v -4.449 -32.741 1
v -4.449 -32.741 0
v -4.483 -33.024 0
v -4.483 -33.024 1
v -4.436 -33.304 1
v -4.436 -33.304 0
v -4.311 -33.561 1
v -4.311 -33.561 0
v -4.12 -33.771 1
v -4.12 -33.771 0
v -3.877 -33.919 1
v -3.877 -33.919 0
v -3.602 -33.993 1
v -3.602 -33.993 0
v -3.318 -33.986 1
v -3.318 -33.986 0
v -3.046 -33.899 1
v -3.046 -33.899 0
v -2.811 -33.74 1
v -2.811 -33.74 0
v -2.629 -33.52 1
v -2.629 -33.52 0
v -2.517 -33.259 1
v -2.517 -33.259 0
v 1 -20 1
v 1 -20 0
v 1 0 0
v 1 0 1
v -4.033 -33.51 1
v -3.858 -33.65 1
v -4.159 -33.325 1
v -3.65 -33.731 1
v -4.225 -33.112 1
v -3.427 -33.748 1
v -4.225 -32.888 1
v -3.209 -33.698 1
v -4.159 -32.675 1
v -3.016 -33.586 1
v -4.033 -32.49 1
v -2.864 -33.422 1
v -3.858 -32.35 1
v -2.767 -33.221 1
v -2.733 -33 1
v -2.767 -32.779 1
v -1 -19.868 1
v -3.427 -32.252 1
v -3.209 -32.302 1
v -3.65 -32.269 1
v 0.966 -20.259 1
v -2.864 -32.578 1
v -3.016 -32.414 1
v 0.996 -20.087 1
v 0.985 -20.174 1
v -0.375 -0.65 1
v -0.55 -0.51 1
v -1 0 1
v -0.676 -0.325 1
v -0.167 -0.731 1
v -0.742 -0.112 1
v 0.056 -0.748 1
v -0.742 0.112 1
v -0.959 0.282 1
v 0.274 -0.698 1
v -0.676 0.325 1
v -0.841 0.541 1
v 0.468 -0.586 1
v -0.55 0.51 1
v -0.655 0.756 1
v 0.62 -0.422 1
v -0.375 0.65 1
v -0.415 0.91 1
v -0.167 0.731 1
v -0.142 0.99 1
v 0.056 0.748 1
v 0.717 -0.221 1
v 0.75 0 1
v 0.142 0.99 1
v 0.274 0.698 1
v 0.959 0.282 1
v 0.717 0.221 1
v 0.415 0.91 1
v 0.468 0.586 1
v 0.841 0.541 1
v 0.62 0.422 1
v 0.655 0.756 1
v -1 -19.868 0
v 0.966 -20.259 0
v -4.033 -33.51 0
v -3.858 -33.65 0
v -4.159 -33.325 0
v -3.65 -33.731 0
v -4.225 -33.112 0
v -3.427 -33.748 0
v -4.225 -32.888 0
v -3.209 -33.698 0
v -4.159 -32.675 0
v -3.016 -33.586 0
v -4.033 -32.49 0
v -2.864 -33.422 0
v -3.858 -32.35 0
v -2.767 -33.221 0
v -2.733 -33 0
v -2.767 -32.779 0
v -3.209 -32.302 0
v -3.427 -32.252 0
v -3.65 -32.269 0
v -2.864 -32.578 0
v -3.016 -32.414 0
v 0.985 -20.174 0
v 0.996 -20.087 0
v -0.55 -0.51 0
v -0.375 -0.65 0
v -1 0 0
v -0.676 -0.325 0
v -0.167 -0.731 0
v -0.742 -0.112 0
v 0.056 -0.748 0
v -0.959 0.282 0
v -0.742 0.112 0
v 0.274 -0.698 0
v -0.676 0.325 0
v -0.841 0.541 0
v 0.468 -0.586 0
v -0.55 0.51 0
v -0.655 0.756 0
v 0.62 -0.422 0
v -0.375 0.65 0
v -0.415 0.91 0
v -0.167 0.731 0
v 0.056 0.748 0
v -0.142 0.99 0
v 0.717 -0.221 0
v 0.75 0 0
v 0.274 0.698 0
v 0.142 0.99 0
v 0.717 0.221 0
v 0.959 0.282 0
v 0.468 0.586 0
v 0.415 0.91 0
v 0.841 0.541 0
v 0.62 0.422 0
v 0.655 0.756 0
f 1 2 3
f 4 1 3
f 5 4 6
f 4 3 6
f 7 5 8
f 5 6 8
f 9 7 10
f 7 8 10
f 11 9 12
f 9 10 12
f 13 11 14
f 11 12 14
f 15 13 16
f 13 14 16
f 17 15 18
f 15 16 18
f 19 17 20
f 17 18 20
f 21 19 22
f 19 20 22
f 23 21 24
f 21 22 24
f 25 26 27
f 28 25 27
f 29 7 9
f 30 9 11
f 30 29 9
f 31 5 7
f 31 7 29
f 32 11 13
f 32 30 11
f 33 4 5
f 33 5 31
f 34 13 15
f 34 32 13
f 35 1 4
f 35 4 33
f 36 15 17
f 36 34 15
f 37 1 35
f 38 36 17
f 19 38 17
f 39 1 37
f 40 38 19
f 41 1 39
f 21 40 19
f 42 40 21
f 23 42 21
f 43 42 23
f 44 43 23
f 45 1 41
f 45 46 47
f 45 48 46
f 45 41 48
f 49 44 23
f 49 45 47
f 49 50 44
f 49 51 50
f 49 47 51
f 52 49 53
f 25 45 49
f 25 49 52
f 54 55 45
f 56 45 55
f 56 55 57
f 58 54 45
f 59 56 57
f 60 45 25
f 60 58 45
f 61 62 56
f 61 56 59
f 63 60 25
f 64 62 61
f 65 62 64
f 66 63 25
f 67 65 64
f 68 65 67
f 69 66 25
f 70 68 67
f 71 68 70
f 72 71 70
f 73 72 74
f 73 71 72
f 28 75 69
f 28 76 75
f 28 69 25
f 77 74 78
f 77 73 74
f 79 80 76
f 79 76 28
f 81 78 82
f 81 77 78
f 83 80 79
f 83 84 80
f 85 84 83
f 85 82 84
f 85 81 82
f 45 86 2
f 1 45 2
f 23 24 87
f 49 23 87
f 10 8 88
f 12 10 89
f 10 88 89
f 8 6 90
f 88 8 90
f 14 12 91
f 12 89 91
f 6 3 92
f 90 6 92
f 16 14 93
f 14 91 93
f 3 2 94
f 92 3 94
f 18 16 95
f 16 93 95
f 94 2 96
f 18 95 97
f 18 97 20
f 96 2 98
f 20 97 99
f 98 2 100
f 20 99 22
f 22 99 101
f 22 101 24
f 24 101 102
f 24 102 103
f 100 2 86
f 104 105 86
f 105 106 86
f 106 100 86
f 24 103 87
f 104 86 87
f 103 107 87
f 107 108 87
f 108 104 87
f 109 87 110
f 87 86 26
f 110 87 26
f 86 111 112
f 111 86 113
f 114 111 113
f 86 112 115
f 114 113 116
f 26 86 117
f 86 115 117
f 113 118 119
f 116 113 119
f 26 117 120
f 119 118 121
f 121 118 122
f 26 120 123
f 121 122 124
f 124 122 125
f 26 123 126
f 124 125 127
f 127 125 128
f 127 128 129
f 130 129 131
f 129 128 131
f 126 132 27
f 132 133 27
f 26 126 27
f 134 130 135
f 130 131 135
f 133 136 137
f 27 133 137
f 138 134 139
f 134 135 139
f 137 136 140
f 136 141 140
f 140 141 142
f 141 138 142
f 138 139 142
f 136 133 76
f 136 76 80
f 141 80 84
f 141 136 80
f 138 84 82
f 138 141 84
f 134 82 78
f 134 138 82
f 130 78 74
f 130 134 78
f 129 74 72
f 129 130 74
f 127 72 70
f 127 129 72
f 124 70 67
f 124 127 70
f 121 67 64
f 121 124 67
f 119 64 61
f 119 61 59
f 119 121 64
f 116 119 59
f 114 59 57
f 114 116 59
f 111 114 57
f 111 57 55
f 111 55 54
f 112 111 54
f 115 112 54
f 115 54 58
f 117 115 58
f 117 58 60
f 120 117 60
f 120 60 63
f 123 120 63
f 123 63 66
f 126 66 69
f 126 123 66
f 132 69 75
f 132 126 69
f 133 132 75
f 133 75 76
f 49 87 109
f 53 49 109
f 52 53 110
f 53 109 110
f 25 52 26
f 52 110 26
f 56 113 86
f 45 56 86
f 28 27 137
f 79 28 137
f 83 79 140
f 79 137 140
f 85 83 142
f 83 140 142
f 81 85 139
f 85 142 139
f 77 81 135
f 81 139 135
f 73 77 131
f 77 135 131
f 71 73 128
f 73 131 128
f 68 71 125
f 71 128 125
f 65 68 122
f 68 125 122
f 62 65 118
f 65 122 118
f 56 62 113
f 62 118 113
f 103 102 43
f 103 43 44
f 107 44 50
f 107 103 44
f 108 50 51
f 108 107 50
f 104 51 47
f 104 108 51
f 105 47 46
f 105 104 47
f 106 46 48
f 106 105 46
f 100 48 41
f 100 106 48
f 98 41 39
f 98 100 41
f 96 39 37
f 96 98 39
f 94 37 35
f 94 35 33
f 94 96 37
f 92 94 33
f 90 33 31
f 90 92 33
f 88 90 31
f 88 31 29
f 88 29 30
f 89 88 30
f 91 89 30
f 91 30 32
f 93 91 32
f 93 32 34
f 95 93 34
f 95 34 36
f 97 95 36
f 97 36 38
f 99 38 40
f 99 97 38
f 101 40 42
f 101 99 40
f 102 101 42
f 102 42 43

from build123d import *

# Parameters (mm, degrees)
SKETCH1_R           = 0.75
BOSS_EXTRUDE1_DEPTH = 1


with BuildPart() as part:
    # Sketch1 → Boss-Extrude1 (new body)
    with BuildSketch(Plane.XY):
        with BuildLine():
            Line((-2.517413675, -33.258819045), (0.965925826, -20.258819045))
            ThreePointArc((0.965925826, -20.258819045), (-0.130526192, -20.991444861), (-1, -20))
            Line((-1, -20), (-1, -19.868347502))
            Line((-1, -19.868347502), (-4.449265328, -32.741180955))
            ThreePointArc((-4.449265328, -32.741180955), (-3.742158547, -33.965925826), (-2.517413675, -33.258819045))
        make_face()
        with Locations((-3.483339502, -33)):
            Circle(SKETCH1_R, mode=Mode.SUBTRACT)
        with BuildLine():
            ThreePointArc((0.965925826, -20.258819045), (0.991444861, -20.130526192), (1, -20))
            ThreePointArc((1, -20), (0.130526192, -19.008555139), (-0.965925826, -19.741180955))
            Line((-0.965925826, -19.741180955), (-1, -19.868347502))
            Line((-1, -19.868347502), (-1, -20))
            ThreePointArc((-1, -20), (-0.130526192, -20.991444861), (0.965925826, -20.258819045))
        make_face()
        with BuildLine():
            Line((1, -20), (1, 0))
            ThreePointArc((1, 0), (0, 1), (-1, 0))
            Line((-1, 0), (-1, -19.868347502))
            Line((-1, -19.868347502), (-0.965925826, -19.741180955))
            ThreePointArc((-0.965925826, -19.741180955), (0.130526192, -19.008555139), (1, -20))
        make_face()
        Circle(SKETCH1_R, mode=Mode.SUBTRACT)
    extrude(amount=BOSS_EXTRUDE1_DEPTH)


solid = part.part
